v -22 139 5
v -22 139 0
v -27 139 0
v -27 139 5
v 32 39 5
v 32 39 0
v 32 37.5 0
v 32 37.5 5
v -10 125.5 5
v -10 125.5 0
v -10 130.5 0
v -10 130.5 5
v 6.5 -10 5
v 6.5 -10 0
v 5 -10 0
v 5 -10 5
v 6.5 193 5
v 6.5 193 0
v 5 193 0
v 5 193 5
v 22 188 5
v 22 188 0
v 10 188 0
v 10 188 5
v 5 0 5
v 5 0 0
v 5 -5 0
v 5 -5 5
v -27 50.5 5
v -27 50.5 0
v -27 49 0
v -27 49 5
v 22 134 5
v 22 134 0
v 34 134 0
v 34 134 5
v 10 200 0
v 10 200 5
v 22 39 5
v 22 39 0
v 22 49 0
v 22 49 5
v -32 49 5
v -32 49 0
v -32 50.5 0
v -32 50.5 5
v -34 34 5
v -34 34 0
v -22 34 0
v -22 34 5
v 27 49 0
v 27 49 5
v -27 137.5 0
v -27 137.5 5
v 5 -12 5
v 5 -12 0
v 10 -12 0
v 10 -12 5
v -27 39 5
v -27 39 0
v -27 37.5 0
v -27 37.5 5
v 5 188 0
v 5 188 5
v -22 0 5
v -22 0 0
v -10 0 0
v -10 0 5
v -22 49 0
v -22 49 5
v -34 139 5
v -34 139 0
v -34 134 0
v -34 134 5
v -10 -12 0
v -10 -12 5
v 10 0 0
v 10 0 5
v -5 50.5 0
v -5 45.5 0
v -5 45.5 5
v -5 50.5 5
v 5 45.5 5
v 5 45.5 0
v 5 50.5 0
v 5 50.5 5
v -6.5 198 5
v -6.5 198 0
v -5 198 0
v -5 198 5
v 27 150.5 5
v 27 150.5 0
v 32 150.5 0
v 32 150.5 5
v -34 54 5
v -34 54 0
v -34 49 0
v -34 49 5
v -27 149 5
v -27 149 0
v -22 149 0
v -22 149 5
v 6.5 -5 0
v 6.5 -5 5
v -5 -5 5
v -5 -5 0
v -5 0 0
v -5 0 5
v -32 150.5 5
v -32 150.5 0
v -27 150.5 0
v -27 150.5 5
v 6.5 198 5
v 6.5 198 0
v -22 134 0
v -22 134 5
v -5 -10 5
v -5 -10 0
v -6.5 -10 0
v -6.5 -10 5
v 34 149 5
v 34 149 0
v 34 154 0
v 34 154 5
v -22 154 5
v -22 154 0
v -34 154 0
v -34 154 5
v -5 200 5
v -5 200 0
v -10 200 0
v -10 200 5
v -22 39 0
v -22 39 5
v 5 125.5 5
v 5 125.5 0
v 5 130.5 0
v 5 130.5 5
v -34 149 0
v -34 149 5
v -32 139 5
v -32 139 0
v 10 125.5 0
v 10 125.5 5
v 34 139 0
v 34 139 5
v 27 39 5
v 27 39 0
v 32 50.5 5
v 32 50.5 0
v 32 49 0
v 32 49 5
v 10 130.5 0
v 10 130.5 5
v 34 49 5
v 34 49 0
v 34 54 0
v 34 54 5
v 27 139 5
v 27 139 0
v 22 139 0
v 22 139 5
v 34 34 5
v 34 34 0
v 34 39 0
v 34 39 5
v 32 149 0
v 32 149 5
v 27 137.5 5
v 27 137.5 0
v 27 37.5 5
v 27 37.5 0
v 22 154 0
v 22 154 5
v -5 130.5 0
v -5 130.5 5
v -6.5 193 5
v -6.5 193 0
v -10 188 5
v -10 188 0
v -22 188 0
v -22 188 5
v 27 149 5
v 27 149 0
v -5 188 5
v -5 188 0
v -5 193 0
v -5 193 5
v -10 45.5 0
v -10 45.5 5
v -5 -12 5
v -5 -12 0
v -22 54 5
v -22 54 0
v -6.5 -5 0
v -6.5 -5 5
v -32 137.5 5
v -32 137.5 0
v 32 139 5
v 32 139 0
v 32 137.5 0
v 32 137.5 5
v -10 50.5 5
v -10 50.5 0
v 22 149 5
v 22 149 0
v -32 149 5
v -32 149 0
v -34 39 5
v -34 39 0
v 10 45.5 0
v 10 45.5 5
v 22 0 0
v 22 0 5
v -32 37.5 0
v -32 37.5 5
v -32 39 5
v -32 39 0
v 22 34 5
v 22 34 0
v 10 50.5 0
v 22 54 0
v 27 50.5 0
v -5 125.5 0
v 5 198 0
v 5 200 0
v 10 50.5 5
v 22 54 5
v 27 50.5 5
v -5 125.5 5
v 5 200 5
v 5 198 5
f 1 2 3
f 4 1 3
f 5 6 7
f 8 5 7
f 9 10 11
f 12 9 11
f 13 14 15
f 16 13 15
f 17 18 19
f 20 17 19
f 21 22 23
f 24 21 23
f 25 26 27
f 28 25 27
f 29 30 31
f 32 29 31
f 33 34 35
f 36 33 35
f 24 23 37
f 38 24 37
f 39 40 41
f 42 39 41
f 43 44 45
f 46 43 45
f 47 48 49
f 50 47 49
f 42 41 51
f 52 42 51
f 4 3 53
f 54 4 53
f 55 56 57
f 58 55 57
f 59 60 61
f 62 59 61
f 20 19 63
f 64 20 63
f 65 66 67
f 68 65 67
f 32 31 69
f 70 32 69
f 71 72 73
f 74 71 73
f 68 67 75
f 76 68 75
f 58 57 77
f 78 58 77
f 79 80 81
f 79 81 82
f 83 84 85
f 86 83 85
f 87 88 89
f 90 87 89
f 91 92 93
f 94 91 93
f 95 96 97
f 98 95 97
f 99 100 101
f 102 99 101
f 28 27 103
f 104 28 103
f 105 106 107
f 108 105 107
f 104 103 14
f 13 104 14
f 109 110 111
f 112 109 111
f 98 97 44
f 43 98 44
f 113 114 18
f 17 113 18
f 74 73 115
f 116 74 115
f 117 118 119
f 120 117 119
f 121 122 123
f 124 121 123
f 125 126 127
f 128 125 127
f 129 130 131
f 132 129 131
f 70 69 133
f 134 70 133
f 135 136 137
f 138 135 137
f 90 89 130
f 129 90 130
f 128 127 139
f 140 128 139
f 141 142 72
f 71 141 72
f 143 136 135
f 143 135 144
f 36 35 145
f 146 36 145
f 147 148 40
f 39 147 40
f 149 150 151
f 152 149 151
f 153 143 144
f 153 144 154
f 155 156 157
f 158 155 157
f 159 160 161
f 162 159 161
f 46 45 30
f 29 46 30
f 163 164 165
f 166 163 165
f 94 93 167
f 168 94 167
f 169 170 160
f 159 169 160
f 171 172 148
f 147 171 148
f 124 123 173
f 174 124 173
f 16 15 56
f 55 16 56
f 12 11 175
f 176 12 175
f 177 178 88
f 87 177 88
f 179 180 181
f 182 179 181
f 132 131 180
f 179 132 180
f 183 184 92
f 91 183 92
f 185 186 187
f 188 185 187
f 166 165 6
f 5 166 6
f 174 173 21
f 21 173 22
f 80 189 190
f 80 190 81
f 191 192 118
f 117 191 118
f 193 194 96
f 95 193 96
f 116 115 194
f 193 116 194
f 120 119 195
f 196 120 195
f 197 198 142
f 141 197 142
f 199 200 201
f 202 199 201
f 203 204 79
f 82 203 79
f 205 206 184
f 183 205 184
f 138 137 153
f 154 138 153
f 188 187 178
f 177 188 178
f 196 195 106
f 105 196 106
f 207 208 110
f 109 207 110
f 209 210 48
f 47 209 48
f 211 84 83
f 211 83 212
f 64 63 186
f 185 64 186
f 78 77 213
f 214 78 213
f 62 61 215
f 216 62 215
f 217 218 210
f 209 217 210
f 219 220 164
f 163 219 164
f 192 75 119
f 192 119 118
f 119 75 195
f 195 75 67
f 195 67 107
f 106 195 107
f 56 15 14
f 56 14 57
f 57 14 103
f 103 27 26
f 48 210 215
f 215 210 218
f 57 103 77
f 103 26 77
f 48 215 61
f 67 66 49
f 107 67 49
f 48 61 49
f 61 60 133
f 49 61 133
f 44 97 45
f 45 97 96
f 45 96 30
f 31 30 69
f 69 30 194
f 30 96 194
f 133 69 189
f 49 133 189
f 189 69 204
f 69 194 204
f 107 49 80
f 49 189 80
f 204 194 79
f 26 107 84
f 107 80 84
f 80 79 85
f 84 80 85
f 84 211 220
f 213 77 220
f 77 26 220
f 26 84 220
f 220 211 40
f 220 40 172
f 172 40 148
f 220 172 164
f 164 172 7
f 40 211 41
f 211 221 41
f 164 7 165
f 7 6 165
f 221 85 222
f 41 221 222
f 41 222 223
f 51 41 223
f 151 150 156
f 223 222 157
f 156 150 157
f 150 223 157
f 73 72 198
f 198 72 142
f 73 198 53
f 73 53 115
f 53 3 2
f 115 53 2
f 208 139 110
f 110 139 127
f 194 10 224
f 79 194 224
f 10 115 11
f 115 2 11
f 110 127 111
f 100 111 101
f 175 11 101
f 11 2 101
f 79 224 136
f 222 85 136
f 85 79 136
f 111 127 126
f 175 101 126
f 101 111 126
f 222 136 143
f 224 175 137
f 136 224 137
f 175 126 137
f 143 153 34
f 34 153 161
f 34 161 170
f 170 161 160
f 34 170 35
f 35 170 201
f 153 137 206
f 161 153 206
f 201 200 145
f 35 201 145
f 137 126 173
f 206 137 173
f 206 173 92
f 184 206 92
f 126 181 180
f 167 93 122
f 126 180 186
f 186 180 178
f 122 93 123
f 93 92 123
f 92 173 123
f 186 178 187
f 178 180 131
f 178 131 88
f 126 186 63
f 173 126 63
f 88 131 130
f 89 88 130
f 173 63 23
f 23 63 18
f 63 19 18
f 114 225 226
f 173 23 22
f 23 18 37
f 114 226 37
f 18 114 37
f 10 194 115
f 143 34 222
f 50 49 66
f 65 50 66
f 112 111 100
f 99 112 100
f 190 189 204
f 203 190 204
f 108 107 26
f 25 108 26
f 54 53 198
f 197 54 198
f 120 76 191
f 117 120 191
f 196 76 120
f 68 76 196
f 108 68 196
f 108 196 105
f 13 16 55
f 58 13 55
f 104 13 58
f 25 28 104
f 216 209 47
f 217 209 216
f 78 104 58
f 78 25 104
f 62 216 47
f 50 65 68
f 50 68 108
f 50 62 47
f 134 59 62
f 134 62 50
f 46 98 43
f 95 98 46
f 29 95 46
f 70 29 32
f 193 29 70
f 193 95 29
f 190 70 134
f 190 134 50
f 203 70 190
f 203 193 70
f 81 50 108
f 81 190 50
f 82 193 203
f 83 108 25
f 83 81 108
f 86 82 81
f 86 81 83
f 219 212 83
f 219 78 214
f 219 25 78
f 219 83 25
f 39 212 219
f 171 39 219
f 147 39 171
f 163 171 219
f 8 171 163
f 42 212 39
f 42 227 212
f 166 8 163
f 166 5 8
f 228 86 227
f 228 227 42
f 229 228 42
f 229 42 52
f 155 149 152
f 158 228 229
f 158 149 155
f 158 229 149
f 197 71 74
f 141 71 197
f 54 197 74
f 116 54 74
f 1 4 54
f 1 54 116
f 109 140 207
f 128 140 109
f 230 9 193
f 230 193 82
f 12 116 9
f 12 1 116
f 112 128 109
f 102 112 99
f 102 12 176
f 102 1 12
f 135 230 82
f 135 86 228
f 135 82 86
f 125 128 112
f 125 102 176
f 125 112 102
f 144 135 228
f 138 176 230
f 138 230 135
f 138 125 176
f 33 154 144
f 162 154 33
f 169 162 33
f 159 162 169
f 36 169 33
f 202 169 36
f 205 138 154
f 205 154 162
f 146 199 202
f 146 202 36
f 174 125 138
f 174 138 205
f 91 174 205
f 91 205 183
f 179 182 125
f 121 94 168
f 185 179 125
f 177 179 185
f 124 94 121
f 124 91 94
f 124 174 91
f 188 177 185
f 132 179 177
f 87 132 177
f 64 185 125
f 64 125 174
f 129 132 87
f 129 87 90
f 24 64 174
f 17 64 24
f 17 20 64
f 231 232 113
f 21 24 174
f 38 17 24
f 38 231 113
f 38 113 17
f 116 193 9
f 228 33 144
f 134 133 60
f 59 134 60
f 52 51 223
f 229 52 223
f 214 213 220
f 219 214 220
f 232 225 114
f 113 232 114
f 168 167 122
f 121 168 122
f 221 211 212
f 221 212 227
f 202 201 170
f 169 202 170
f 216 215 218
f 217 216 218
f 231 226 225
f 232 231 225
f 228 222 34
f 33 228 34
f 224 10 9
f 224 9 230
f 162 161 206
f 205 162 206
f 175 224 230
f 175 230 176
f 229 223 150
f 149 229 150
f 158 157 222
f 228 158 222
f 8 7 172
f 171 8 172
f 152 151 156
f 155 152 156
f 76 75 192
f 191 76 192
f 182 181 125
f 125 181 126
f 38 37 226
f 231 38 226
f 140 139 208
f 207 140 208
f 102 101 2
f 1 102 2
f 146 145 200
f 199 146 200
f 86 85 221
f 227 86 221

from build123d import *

# Parameters (mm, degrees)
ESQUISSE1_W        = 5
ESQUISSE1_H        = 5
BOSS_EXTRU_1_DEPTH = 5


with BuildPart() as part:
    # Esquisse1 → Boss.-Extru.1 (new body)
    with BuildSketch(Plane.XY):
        Polygon((-10, 188), (-22, 188), (-22, 154), (-34, 154), (-34, 149), (-32, 149), (-32, 150.5), (-27, 150.5), (-27, 149), (-22, 149), (-22, 139), (-27, 139), (-27, 137.5), (-32, 137.5), (-32, 139), (-34, 139), (-34, 134), (-22, 134), (-22, 54), (-34, 54), (-34, 49), (-32, 49), (-32, 50.5), (-27, 50.5), (-27, 49), (-22, 49), (-22, 39), (-27, 39), (-27, 37.5), (-32, 37.5), (-32, 39), (-34, 39), (-34, 34), (-22, 34), (-22, 0), (-10, 0), (-10, -12), (-5, -12), (-5, -10), (-6.5, -10), (-6.5, -5), (-5, -5), (-5, 0), (5, 0), (5, -5), (6.5, -5), (6.5, -10), (5, -10), (5, -12), (10, -12), (10, 0), (22, 0), (22, 34), (34, 34), (34, 39), (32, 39), (32, 37.5), (27, 37.5), (27, 39), (22, 39), (22, 49), (27, 49), (27, 50.5), (32, 50.5), (32, 49), (34, 49), (34, 54), (22, 54), (22, 134), (34, 134), (34, 139), (32, 139), (32, 137.5), (27, 137.5), (27, 139), (22, 139), (22, 149), (27, 149), (27, 150.5), (32, 150.5), (32, 149), (34, 149), (34, 154), (22, 154), (22, 188), (10, 188), (10, 200), (5, 200), (5, 198), (6.5, 198), (6.5, 193), (5, 193), (5, 188), (-5, 188), (-5, 193), (-6.5, 193), (-6.5, 198), (-5, 198), (-5, 200), (-10, 200), align=None)
        with Locations((-7.5, 48)):
            Rectangle(ESQUISSE1_W, ESQUISSE1_H, mode=Mode.SUBTRACT)
        with Locations((7.5, 48)):
            Rectangle(ESQUISSE1_W, ESQUISSE1_H, mode=Mode.SUBTRACT)
        with Locations((-7.5, 128)):
            Rectangle(ESQUISSE1_W, ESQUISSE1_H, mode=Mode.SUBTRACT)
        with Locations((7.5, 128)):
            Rectangle(ESQUISSE1_W, ESQUISSE1_H, mode=Mode.SUBTRACT)
    extrude(amount=BOSS_EXTRU_1_DEPTH)


solid = part.part
